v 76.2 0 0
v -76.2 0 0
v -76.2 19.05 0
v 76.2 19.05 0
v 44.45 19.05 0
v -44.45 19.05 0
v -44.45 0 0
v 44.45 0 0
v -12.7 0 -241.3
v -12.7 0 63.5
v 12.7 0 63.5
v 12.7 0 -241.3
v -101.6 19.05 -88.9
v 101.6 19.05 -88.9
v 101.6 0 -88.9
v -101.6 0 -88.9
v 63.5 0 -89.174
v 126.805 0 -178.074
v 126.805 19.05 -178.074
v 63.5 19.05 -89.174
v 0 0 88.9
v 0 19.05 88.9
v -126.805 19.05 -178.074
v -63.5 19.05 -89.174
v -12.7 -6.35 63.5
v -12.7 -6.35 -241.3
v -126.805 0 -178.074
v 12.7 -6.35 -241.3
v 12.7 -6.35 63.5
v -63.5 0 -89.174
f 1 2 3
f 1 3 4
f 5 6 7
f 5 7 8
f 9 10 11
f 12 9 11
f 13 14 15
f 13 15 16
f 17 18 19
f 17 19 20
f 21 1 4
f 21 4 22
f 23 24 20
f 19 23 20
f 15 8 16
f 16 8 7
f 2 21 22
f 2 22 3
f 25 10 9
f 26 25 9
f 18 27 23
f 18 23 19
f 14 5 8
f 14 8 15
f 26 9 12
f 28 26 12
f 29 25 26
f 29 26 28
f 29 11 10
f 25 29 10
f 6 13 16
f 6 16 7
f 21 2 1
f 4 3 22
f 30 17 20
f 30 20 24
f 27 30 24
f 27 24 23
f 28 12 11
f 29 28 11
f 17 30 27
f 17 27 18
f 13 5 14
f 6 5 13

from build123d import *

# Parameters (mm, degrees)
F1_DEPTH = 19.05
F3_DEPTH = 19.05
F5_DEPTH = 19.05
F7_DEPTH = 6.35


with BuildPart() as f1:
    # F0 (on Front) → F1 (new body)
    with BuildSketch(Plane.XZ):
        Polygon((-76.2, 0), (0, 0), (76.2, 0), (0, 88.9), align=None)
    extrude(amount=-F1_DEPTH)


with BuildPart() as f3:
    # F2 (on face) → F3 (new body)
    with BuildSketch(Plane(origin=(0, 19.05, 0), x_dir=(-1, 0, 0), z_dir=(0, 1, 0))):
        Polygon((44.45, 0), (-44.45, 0), (-101.6, -88.9), (0, -88.9), (101.6, -88.9), align=None)
    extrude(amount=-F3_DEPTH)


with BuildPart() as f5:
    # F4 (on Front) → F5 (new body)
    with BuildSketch(Plane.XZ):
        Polygon((63.5, -89.173857), (-63.5, -89.173857), (-126.804988, -178.073857), (0, -178.073857), (126.804988, -178.073857), align=None)
    extrude(amount=-F5_DEPTH)


with BuildPart() as f7:
    # F6 (on Front) → F7 (new body)
    with BuildSketch(Plane.XZ):
        Polygon((12.7, 63.5), (0, 63.5), (-12.7, 63.5), (-12.7, -241.3), (0, -241.3), (12.7, -241.3), align=None)
    extrude(amount=F7_DEPTH)


solid = Compound([f1.part, f3.part, f5.part, f7.part])
